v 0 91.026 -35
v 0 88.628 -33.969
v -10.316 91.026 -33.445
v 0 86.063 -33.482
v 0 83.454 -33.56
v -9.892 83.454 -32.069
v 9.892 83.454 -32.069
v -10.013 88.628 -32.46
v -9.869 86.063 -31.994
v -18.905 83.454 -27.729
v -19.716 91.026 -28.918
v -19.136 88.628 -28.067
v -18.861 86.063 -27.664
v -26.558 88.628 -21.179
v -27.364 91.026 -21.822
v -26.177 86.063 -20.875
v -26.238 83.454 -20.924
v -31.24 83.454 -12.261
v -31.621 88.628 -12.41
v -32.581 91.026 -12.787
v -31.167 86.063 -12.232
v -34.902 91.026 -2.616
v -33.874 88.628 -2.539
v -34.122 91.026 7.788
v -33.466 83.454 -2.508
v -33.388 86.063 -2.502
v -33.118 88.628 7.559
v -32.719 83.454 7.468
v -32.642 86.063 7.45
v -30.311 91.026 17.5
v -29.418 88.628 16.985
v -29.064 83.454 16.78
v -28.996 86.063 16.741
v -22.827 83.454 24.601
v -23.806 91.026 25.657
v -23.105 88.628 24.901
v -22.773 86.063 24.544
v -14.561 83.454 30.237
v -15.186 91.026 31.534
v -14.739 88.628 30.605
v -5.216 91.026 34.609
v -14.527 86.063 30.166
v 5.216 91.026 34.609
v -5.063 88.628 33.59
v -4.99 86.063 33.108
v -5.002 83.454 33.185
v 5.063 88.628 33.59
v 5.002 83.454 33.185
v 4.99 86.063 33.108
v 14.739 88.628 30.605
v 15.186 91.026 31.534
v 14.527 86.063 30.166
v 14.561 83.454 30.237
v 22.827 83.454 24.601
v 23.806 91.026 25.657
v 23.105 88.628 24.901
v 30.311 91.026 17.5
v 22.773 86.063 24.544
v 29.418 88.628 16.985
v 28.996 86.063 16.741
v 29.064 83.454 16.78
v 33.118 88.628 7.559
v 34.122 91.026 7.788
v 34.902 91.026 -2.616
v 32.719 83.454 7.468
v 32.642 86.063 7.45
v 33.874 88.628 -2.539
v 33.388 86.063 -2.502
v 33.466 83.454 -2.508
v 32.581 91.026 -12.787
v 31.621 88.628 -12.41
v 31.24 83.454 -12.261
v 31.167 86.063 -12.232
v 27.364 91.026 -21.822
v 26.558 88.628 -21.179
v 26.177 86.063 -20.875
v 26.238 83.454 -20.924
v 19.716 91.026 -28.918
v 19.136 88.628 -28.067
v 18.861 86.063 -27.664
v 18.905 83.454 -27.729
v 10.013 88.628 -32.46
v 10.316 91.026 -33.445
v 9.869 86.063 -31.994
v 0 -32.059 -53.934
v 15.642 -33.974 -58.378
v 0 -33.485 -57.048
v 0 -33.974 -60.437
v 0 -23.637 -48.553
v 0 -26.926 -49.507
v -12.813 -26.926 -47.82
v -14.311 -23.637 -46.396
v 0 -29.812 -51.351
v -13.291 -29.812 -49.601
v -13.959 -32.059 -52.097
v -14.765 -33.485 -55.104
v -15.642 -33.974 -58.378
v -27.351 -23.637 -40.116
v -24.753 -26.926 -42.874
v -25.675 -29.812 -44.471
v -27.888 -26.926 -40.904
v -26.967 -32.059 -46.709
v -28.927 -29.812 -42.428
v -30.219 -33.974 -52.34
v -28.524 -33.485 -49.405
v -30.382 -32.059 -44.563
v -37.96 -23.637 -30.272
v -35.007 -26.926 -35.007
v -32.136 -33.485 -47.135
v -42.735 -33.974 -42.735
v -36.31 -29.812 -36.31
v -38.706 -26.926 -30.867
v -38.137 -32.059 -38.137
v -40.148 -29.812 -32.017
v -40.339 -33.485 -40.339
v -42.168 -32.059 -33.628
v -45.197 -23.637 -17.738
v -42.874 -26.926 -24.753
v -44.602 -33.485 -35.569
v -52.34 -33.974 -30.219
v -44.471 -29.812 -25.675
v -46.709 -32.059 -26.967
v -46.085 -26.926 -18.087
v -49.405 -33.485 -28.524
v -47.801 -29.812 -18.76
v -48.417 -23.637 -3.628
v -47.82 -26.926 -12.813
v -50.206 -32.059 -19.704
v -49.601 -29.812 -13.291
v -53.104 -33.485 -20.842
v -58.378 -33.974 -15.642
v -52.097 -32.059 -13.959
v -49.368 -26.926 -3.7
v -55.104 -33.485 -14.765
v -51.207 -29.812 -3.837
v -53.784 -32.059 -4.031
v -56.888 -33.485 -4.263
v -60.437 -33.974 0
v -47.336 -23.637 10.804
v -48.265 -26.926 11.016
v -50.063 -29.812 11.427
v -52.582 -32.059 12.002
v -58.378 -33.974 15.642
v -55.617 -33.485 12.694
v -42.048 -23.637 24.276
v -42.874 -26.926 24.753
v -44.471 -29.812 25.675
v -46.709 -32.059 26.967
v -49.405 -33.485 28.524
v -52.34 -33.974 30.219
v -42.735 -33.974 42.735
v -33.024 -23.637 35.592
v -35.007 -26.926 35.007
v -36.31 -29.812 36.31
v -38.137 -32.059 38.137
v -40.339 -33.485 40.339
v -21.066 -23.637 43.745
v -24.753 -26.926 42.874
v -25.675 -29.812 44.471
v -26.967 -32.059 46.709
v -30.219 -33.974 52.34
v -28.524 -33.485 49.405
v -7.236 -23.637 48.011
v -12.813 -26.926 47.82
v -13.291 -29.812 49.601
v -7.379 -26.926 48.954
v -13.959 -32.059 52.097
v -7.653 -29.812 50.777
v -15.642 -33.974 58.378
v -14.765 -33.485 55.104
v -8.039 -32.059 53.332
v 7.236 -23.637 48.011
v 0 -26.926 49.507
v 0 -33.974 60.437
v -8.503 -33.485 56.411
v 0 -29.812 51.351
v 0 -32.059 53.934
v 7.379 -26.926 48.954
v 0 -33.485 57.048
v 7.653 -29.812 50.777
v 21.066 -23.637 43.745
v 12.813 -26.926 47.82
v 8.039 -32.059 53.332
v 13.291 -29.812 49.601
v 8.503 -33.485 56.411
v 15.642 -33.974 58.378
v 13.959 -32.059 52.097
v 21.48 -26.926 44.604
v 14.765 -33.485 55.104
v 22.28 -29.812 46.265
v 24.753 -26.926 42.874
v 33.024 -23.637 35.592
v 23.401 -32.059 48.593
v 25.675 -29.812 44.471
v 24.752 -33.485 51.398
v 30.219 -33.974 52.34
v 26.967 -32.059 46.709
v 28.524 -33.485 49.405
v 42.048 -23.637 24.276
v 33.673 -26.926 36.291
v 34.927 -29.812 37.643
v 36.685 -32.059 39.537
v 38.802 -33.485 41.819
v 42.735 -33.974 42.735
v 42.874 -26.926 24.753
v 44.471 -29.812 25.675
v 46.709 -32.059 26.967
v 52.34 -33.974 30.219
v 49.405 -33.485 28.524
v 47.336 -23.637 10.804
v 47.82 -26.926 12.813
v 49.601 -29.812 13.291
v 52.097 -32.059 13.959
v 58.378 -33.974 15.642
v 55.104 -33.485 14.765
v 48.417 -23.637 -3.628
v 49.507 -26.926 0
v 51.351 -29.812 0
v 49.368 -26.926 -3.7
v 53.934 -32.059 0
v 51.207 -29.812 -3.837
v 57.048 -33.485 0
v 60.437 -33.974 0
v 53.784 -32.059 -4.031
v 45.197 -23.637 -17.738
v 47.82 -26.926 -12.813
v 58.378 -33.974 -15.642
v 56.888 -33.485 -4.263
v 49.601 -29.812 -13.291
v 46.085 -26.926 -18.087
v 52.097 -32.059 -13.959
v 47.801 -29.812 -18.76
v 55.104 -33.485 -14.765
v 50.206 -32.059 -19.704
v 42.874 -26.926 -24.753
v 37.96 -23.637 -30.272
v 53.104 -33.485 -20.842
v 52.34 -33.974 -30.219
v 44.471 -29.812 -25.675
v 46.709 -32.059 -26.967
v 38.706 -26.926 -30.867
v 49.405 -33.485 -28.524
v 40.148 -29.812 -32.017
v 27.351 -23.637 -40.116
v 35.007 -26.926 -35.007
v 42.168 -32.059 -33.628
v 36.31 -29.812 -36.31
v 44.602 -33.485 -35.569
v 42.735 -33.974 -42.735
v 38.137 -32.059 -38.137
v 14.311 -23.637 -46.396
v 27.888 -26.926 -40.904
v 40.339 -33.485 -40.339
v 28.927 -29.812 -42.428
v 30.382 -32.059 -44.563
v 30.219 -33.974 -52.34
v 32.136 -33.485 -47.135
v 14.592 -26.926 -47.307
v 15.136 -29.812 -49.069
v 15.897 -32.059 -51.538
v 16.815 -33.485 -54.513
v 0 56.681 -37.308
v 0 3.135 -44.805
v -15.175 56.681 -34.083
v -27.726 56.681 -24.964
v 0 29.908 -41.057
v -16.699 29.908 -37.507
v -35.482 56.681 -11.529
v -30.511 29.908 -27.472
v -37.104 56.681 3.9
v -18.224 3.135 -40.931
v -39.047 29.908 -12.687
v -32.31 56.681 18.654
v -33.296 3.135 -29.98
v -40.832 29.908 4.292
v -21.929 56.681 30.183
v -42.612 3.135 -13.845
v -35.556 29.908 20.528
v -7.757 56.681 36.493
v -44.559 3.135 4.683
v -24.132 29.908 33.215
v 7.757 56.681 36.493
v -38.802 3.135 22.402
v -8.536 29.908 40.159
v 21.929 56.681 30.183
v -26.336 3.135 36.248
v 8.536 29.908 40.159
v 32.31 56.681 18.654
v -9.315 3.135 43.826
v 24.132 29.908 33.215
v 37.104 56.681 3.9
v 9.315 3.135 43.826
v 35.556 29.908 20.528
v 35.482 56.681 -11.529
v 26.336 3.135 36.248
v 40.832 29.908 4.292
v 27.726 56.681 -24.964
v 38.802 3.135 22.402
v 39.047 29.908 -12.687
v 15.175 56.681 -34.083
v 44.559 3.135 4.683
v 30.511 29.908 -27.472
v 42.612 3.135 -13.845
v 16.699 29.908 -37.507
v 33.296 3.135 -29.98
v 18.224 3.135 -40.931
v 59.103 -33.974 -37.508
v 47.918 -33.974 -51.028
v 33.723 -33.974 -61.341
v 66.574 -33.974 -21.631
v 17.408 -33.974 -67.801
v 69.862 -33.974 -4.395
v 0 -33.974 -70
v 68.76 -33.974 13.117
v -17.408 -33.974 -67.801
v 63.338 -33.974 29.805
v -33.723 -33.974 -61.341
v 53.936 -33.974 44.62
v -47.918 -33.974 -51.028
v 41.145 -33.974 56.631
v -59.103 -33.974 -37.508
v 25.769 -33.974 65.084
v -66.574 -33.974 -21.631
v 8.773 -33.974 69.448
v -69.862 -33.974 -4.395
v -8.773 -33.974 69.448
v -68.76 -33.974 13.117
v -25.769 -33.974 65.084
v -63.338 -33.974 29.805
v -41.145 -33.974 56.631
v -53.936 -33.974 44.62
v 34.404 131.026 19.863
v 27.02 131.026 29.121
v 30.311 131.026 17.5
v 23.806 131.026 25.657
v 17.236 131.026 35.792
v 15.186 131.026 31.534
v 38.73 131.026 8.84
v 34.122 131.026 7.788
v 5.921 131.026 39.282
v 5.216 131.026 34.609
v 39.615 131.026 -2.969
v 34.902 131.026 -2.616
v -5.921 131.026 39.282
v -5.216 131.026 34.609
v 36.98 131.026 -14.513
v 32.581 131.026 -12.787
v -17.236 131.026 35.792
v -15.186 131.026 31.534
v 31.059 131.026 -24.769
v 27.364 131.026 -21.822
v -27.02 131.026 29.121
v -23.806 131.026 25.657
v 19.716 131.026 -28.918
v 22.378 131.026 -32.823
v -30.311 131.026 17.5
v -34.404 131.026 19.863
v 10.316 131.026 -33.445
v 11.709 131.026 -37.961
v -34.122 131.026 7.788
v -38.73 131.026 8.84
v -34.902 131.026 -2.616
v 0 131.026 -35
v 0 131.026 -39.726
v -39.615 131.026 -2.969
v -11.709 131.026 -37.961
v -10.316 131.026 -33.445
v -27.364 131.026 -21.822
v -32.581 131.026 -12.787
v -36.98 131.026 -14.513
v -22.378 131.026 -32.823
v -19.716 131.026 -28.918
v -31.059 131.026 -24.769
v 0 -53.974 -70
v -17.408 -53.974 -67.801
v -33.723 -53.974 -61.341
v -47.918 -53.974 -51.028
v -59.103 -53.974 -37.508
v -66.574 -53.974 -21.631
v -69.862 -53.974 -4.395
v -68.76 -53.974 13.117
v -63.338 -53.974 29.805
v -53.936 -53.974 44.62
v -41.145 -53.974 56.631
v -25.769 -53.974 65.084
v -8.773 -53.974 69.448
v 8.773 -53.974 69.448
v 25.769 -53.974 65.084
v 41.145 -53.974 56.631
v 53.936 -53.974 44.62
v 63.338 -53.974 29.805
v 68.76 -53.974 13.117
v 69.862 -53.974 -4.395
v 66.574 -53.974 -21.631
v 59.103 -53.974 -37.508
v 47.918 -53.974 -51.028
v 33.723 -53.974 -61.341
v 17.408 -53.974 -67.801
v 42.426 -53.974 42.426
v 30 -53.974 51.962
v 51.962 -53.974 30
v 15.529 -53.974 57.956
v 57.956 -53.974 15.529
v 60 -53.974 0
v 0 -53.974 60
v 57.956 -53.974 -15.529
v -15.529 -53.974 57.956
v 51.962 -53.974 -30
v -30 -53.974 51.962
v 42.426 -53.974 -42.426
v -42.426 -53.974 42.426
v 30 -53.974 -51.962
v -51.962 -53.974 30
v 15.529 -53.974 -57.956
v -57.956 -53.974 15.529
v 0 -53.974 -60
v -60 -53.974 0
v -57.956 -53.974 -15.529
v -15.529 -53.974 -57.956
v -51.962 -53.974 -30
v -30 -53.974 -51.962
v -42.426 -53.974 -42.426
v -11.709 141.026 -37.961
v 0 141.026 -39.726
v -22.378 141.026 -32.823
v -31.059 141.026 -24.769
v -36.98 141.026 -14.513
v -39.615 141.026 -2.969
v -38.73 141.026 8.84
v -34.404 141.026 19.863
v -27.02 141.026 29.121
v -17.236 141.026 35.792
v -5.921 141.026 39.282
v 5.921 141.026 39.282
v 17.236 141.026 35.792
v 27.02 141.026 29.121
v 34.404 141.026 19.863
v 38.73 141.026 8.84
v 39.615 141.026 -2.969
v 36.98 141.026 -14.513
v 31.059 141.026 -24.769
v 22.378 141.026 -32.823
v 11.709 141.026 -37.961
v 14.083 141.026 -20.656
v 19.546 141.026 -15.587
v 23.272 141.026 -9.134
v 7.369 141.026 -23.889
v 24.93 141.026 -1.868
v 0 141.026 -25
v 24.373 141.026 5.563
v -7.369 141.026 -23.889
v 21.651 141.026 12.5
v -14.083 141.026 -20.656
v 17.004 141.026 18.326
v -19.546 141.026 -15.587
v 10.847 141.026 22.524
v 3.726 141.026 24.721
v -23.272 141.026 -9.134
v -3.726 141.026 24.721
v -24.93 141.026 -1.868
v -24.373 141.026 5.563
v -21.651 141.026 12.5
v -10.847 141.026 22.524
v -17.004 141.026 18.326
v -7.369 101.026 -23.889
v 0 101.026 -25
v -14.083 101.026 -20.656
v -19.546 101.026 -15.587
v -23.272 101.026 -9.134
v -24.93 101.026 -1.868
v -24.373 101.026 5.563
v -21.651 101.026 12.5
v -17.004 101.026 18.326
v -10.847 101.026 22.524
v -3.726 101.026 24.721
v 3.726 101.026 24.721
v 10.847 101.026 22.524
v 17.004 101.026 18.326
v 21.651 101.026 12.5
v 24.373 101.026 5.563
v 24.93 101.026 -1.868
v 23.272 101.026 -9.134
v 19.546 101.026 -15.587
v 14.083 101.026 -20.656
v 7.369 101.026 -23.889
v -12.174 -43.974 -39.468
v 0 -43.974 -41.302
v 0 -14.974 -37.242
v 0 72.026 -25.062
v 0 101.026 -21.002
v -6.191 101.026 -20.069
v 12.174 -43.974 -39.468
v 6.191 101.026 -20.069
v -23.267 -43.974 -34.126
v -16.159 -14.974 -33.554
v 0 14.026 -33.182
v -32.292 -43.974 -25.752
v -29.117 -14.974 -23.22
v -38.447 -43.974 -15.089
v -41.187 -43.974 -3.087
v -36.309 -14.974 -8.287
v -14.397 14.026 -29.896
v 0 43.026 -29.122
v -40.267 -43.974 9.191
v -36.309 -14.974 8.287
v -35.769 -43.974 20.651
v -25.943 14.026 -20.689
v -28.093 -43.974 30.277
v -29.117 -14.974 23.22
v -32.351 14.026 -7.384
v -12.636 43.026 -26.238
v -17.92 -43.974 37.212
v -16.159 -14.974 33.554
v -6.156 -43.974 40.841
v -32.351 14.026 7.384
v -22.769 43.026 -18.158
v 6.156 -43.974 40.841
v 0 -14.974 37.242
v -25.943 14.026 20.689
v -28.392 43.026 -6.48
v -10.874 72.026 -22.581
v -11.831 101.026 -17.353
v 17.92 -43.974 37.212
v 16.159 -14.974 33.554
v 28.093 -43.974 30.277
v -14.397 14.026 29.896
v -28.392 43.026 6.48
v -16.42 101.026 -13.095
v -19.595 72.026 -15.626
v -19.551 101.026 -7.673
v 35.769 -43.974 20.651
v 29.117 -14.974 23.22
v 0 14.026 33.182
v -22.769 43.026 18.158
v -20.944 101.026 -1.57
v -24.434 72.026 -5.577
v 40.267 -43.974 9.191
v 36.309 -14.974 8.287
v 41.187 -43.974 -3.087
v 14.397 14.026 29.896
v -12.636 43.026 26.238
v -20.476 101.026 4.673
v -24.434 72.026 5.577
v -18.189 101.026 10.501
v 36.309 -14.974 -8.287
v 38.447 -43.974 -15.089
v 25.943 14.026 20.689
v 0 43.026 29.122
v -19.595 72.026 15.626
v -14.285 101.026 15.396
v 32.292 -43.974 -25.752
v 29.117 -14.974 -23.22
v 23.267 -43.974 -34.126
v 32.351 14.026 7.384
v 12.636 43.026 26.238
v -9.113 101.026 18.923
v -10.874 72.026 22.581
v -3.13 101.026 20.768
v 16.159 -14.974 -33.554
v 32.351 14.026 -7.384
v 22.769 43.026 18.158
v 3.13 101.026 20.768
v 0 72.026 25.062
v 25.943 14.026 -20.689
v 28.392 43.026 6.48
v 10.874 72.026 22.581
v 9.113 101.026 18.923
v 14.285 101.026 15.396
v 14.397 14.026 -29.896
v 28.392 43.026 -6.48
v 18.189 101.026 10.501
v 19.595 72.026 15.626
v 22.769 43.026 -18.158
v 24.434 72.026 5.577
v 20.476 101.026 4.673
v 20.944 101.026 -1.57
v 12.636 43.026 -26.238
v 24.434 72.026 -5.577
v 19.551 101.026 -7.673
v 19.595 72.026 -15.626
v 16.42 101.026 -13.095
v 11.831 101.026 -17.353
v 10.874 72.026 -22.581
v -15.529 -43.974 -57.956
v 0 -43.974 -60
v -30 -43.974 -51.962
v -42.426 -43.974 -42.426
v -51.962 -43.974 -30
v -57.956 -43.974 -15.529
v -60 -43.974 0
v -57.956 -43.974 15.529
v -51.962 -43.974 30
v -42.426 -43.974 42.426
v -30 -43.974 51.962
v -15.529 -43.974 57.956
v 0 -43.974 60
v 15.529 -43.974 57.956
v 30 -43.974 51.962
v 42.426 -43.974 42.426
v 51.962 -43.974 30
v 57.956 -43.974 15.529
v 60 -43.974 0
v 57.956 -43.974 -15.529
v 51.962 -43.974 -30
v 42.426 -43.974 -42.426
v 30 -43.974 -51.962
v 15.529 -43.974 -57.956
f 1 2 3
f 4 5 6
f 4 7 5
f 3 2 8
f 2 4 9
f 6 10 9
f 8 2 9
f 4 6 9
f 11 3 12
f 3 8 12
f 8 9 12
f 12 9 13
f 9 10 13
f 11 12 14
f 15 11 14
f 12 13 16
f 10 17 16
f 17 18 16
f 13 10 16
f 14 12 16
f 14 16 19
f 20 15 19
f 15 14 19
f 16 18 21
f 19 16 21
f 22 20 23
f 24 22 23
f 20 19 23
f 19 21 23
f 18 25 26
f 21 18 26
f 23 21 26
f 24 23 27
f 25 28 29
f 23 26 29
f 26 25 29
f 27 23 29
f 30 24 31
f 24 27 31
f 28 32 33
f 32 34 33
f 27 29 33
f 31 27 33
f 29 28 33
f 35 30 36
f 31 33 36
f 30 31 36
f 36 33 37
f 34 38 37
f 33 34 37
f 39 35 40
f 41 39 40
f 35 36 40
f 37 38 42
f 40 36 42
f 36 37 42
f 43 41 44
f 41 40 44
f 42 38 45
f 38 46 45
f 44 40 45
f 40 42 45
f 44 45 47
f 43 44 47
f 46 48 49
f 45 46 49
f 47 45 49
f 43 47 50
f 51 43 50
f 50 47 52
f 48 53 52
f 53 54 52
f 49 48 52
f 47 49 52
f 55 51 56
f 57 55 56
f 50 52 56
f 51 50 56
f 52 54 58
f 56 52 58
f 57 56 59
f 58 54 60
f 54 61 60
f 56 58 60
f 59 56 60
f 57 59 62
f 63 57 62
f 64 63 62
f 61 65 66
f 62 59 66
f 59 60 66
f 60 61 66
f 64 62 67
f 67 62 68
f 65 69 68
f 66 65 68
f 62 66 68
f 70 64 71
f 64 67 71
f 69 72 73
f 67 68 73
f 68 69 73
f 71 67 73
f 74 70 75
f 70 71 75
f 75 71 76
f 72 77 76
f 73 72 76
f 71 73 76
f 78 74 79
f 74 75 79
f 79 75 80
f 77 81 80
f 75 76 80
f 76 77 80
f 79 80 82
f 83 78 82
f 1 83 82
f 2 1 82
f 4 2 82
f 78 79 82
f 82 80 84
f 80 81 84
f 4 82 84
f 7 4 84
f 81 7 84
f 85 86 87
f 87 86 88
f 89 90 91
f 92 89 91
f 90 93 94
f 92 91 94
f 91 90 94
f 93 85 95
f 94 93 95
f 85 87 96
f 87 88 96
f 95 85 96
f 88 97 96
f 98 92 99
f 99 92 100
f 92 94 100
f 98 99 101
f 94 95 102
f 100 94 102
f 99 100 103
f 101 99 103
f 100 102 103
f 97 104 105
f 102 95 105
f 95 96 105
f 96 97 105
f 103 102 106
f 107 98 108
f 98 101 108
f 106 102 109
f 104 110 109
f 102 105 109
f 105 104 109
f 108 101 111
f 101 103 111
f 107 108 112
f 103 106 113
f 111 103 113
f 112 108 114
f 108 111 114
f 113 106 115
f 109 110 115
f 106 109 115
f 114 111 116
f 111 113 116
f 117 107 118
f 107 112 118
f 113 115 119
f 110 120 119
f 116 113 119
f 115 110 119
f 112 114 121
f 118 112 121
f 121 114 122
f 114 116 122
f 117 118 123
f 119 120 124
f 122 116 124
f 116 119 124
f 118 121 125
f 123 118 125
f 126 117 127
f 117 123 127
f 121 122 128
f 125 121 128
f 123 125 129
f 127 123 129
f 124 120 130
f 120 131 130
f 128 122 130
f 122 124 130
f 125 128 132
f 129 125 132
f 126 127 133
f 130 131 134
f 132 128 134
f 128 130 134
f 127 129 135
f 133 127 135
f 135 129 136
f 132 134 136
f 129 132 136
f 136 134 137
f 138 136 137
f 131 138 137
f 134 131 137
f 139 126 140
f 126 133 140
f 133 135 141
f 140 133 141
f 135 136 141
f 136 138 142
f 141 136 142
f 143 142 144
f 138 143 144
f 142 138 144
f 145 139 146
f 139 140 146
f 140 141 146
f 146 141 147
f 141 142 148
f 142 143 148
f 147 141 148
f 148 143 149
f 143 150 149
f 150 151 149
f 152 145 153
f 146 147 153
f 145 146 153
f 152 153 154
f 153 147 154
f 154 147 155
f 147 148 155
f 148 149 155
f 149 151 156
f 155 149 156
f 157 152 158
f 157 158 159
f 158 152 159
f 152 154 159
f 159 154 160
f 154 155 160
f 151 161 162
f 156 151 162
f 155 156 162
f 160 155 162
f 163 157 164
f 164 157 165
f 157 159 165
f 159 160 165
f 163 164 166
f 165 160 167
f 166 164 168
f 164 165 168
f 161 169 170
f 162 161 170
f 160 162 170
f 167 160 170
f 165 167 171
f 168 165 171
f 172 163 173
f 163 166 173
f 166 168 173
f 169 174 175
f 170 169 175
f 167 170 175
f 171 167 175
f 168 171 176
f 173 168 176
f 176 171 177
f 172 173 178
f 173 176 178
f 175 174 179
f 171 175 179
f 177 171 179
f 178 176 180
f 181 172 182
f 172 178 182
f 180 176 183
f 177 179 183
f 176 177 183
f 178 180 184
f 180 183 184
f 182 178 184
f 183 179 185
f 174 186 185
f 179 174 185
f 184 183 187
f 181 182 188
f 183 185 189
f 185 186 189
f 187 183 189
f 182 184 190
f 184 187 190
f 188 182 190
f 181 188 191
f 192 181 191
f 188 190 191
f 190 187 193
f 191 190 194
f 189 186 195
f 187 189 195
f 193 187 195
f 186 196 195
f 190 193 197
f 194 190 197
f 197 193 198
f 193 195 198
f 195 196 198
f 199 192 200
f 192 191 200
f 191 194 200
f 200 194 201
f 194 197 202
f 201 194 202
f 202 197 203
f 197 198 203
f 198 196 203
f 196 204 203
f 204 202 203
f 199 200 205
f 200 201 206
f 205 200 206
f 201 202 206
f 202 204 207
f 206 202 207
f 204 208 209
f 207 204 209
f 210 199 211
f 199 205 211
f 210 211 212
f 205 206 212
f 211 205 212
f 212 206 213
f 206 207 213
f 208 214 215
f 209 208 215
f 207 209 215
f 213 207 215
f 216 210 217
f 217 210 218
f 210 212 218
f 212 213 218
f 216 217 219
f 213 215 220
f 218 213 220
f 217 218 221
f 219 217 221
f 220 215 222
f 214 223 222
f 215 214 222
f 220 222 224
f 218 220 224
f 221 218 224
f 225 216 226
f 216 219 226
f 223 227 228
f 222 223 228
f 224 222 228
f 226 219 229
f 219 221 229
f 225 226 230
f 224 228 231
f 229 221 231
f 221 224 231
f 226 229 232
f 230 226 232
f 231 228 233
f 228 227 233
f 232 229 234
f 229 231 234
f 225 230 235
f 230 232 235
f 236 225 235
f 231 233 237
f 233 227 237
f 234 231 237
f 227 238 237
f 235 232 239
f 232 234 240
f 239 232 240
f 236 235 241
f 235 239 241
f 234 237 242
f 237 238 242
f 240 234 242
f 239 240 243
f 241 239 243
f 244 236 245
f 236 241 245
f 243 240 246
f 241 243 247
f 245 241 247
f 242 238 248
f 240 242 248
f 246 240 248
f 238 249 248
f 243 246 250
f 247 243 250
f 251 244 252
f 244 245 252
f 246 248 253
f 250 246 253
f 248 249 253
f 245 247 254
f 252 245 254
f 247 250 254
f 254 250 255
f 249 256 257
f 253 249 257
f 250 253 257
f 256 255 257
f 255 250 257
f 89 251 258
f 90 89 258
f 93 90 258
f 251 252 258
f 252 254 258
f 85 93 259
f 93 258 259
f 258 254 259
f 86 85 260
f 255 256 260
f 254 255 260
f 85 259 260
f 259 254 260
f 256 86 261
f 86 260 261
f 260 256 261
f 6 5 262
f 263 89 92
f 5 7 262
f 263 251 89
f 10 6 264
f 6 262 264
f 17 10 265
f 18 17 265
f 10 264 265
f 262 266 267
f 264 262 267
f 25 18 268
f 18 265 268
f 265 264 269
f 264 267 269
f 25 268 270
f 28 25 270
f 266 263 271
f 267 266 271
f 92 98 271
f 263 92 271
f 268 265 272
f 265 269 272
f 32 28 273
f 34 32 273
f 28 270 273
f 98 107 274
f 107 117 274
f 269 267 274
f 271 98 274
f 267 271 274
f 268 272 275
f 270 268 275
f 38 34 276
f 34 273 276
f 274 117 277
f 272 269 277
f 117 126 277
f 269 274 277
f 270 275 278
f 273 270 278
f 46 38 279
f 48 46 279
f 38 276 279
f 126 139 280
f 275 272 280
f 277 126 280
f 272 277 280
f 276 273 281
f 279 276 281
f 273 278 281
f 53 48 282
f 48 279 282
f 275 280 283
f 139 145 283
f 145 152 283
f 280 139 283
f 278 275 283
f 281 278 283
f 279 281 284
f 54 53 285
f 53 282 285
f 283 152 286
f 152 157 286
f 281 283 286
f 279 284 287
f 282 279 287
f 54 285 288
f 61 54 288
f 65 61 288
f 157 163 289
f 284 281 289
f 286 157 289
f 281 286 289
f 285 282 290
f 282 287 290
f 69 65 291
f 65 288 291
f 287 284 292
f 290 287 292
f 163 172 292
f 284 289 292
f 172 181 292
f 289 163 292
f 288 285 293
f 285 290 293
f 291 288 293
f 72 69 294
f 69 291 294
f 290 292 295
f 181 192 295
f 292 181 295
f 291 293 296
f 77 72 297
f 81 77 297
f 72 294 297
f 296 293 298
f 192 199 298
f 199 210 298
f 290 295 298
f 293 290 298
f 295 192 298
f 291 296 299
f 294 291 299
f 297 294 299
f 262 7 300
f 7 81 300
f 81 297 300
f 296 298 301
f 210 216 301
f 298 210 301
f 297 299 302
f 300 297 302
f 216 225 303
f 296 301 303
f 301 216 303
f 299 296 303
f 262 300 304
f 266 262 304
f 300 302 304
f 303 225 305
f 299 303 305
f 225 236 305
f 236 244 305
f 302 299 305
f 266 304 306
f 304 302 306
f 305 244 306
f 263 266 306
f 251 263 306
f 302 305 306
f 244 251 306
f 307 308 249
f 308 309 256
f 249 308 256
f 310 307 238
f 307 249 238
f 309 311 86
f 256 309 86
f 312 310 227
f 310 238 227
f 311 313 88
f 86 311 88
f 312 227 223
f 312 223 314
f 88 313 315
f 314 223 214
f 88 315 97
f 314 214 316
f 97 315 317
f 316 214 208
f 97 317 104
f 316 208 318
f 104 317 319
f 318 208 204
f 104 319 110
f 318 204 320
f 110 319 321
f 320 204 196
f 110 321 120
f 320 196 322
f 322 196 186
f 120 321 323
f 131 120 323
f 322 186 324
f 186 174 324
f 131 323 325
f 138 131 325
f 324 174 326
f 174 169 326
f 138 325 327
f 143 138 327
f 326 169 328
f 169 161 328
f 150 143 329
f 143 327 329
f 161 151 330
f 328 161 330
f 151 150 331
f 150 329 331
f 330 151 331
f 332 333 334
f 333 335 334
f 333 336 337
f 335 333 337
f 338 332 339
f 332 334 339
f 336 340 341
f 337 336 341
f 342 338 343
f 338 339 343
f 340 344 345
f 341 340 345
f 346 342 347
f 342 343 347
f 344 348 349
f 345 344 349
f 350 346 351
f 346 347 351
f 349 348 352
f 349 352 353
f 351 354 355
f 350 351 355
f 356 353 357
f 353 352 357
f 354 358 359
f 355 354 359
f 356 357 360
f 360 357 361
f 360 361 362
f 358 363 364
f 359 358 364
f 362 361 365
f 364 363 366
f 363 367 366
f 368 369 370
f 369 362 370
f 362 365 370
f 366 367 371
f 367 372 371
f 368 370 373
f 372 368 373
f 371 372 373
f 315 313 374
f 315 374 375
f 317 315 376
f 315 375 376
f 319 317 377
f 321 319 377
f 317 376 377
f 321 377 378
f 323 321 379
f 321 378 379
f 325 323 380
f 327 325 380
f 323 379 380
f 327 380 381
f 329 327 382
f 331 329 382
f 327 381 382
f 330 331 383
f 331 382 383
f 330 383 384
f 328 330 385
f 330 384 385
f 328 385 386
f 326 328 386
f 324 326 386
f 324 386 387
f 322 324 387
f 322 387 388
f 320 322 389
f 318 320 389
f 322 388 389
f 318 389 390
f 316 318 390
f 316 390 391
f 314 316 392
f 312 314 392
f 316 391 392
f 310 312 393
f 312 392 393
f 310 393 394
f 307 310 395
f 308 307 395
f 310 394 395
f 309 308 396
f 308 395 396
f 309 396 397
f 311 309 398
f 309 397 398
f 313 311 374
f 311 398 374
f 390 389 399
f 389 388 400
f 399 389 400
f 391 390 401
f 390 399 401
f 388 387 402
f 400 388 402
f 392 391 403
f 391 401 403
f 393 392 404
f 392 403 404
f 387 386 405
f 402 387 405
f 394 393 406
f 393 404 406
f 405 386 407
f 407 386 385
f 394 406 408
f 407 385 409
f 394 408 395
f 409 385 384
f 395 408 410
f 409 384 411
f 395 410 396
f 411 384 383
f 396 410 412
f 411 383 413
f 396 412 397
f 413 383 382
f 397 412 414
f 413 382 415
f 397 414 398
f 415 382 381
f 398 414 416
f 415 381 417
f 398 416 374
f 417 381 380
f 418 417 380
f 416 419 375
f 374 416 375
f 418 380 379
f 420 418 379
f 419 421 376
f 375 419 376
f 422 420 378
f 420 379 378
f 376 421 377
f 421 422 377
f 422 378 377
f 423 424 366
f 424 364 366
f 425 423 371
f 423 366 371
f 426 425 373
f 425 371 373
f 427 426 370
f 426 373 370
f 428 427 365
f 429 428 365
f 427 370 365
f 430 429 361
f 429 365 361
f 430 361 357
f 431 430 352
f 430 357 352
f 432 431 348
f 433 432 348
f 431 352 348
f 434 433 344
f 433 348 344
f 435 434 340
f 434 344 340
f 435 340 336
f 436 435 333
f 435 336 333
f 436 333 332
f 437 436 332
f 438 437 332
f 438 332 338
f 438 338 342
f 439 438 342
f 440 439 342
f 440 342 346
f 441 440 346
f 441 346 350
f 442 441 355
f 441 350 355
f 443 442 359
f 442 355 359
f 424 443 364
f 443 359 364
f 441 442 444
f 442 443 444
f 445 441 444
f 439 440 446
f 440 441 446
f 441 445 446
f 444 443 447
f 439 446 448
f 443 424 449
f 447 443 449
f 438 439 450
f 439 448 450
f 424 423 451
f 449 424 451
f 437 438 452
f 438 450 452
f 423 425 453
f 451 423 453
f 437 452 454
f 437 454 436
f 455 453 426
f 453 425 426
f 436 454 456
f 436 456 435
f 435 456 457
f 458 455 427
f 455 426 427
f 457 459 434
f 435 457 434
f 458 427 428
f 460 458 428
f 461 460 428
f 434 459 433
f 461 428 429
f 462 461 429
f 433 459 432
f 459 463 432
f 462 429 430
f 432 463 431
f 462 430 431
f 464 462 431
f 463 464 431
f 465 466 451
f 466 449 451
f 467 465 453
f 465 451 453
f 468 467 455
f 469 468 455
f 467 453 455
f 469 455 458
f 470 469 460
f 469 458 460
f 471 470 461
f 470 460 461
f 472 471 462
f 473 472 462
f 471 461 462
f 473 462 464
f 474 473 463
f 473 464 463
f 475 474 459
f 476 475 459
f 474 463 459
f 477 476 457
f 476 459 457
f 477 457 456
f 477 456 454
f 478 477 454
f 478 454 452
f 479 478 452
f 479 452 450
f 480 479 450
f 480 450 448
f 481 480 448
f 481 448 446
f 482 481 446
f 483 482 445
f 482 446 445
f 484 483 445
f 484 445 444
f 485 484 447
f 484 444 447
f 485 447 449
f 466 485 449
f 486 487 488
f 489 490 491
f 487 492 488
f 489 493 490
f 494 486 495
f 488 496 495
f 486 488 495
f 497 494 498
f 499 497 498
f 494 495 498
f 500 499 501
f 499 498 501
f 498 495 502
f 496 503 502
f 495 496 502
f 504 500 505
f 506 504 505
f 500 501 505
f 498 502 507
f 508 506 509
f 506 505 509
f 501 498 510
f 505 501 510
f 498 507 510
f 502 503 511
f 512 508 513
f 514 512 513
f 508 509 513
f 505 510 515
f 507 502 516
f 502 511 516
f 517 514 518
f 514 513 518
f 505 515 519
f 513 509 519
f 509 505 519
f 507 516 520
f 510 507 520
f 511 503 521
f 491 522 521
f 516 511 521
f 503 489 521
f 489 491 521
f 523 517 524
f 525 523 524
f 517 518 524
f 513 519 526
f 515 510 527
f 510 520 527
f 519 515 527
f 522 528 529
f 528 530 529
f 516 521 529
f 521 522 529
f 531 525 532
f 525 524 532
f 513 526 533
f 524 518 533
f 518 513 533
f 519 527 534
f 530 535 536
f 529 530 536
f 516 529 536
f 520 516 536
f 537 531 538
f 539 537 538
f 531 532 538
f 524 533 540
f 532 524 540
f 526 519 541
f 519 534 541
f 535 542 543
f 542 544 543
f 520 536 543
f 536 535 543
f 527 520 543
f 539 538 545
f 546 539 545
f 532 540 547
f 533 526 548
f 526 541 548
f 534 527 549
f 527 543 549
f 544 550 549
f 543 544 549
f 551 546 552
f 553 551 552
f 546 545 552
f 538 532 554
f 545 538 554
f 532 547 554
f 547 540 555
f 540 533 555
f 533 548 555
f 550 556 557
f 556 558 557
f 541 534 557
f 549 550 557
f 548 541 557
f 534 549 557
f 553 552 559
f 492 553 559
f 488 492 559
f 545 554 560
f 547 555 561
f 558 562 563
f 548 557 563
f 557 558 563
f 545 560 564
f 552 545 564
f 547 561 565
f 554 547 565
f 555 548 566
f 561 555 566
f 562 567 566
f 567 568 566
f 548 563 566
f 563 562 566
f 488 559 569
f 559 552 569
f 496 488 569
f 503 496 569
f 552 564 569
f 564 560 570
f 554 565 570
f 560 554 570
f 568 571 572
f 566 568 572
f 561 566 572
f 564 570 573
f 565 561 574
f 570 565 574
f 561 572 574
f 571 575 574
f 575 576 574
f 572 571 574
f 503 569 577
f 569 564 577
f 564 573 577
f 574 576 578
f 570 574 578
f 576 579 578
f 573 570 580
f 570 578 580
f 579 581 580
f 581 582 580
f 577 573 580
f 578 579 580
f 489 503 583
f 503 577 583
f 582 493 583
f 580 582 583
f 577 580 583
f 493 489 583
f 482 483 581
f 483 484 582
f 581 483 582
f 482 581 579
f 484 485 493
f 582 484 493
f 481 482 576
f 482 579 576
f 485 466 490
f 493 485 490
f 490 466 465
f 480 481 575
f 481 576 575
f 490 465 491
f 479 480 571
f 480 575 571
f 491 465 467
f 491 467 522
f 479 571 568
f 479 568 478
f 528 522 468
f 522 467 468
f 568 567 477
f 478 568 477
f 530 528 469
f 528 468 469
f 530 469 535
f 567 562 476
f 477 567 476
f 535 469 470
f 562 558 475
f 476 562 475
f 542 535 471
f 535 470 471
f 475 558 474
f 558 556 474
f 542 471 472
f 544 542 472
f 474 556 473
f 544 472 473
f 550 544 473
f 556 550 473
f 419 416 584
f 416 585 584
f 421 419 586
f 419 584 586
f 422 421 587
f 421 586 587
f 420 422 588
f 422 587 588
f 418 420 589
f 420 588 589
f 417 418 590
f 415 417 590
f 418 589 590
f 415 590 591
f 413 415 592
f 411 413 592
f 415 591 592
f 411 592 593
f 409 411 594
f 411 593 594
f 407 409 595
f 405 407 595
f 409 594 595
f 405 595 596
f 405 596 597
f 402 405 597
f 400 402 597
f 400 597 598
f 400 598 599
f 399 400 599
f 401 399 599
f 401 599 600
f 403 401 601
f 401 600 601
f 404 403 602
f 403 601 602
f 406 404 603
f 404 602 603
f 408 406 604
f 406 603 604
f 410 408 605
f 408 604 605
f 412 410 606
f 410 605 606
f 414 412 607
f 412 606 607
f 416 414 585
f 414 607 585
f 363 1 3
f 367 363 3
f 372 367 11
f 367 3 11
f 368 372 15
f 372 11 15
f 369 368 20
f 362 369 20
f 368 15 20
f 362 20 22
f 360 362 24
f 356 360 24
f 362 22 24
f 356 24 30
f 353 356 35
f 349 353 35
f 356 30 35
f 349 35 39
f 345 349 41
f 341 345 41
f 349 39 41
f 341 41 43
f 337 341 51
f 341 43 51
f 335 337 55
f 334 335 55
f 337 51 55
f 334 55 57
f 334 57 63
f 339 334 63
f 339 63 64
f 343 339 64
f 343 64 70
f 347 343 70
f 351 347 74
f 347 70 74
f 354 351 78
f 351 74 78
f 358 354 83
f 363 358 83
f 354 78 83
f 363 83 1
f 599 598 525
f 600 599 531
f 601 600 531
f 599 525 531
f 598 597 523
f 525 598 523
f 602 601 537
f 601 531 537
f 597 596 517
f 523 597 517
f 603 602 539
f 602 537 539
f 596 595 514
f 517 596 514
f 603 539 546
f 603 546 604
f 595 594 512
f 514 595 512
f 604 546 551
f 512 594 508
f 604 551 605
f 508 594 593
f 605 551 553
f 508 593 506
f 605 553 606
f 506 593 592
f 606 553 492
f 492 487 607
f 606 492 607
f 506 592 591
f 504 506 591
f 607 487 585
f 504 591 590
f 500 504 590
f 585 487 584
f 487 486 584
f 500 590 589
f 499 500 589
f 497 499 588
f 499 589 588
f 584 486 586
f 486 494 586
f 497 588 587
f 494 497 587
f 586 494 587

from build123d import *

# Parameters (mm, degrees)
FILLET1_R = 12
FILLET2_R = 12


with BuildPart() as part:
    # Sketch2 → Revolve-Thin2 (revolve)
    with BuildSketch(Plane.XY, mode=Mode.PRIVATE) as revolve_thin2_sk:
        Polygon((39.725895331, 131.026369151), (35, 131.026369151), (35, 91.026369151), (32.5, 91.026369151), (50, -33.973630849), (70, -33.973630849), (70, -53.973630849), (60, -53.973630849), (60, -43.973630849), (41.302475551, -43.973630849), (21.002475551, 101.026369151), (25, 101.026369151), (25, 141.026369151), (39.725895331, 141.026369151), align=None)
    revolve(revolve_thin2_sk.sketch.rotate(Axis((0, -92.5, 0), (0, 1, 0)), 90), axis=Axis((0, -92.5, 0), (0, 1, 0)))

    # Fillet1
    # the kernel refuses this fillet: 12 mm, written as the material it adds along each edge
    with BuildSketch(Plane(origin=(0, 91.026369151, 0), x_dir=(0, 0, -1), z_dir=(1, 0, 0))) as fillet1_piece_1:
        with BuildLine():
            CenterArc((45.444294459, -5.909036575), FILLET1_R, 150.500253151, 37.469357243)
            Line((33.560193499, -7.572810709), (33.32251148, -7.606086192))
            Line((33.32251148, -7.606086192), (32.262317981, -0.033275483))
            Line((32.262317981, -0.033275483), (32.5, 0.24))
            ThreePointArc((32.5, 0.24), (33.75, 0.24), (34.791114111, 0.118180731))
            Line((34.791114111, 0.118180731), (35, 0))
        make_face()
    revolve(axis=Axis((0, 91.026369151, 0), (0, 1, 0)))

    # Fillet2
    fillet2_edges = [part.edges().sort_by_distance(p)[0] for p in [
        (0, -33.973630849, 50),
    ]]
    fillet(fillet2_edges, radius=FILLET2_R)


solid = part.part
